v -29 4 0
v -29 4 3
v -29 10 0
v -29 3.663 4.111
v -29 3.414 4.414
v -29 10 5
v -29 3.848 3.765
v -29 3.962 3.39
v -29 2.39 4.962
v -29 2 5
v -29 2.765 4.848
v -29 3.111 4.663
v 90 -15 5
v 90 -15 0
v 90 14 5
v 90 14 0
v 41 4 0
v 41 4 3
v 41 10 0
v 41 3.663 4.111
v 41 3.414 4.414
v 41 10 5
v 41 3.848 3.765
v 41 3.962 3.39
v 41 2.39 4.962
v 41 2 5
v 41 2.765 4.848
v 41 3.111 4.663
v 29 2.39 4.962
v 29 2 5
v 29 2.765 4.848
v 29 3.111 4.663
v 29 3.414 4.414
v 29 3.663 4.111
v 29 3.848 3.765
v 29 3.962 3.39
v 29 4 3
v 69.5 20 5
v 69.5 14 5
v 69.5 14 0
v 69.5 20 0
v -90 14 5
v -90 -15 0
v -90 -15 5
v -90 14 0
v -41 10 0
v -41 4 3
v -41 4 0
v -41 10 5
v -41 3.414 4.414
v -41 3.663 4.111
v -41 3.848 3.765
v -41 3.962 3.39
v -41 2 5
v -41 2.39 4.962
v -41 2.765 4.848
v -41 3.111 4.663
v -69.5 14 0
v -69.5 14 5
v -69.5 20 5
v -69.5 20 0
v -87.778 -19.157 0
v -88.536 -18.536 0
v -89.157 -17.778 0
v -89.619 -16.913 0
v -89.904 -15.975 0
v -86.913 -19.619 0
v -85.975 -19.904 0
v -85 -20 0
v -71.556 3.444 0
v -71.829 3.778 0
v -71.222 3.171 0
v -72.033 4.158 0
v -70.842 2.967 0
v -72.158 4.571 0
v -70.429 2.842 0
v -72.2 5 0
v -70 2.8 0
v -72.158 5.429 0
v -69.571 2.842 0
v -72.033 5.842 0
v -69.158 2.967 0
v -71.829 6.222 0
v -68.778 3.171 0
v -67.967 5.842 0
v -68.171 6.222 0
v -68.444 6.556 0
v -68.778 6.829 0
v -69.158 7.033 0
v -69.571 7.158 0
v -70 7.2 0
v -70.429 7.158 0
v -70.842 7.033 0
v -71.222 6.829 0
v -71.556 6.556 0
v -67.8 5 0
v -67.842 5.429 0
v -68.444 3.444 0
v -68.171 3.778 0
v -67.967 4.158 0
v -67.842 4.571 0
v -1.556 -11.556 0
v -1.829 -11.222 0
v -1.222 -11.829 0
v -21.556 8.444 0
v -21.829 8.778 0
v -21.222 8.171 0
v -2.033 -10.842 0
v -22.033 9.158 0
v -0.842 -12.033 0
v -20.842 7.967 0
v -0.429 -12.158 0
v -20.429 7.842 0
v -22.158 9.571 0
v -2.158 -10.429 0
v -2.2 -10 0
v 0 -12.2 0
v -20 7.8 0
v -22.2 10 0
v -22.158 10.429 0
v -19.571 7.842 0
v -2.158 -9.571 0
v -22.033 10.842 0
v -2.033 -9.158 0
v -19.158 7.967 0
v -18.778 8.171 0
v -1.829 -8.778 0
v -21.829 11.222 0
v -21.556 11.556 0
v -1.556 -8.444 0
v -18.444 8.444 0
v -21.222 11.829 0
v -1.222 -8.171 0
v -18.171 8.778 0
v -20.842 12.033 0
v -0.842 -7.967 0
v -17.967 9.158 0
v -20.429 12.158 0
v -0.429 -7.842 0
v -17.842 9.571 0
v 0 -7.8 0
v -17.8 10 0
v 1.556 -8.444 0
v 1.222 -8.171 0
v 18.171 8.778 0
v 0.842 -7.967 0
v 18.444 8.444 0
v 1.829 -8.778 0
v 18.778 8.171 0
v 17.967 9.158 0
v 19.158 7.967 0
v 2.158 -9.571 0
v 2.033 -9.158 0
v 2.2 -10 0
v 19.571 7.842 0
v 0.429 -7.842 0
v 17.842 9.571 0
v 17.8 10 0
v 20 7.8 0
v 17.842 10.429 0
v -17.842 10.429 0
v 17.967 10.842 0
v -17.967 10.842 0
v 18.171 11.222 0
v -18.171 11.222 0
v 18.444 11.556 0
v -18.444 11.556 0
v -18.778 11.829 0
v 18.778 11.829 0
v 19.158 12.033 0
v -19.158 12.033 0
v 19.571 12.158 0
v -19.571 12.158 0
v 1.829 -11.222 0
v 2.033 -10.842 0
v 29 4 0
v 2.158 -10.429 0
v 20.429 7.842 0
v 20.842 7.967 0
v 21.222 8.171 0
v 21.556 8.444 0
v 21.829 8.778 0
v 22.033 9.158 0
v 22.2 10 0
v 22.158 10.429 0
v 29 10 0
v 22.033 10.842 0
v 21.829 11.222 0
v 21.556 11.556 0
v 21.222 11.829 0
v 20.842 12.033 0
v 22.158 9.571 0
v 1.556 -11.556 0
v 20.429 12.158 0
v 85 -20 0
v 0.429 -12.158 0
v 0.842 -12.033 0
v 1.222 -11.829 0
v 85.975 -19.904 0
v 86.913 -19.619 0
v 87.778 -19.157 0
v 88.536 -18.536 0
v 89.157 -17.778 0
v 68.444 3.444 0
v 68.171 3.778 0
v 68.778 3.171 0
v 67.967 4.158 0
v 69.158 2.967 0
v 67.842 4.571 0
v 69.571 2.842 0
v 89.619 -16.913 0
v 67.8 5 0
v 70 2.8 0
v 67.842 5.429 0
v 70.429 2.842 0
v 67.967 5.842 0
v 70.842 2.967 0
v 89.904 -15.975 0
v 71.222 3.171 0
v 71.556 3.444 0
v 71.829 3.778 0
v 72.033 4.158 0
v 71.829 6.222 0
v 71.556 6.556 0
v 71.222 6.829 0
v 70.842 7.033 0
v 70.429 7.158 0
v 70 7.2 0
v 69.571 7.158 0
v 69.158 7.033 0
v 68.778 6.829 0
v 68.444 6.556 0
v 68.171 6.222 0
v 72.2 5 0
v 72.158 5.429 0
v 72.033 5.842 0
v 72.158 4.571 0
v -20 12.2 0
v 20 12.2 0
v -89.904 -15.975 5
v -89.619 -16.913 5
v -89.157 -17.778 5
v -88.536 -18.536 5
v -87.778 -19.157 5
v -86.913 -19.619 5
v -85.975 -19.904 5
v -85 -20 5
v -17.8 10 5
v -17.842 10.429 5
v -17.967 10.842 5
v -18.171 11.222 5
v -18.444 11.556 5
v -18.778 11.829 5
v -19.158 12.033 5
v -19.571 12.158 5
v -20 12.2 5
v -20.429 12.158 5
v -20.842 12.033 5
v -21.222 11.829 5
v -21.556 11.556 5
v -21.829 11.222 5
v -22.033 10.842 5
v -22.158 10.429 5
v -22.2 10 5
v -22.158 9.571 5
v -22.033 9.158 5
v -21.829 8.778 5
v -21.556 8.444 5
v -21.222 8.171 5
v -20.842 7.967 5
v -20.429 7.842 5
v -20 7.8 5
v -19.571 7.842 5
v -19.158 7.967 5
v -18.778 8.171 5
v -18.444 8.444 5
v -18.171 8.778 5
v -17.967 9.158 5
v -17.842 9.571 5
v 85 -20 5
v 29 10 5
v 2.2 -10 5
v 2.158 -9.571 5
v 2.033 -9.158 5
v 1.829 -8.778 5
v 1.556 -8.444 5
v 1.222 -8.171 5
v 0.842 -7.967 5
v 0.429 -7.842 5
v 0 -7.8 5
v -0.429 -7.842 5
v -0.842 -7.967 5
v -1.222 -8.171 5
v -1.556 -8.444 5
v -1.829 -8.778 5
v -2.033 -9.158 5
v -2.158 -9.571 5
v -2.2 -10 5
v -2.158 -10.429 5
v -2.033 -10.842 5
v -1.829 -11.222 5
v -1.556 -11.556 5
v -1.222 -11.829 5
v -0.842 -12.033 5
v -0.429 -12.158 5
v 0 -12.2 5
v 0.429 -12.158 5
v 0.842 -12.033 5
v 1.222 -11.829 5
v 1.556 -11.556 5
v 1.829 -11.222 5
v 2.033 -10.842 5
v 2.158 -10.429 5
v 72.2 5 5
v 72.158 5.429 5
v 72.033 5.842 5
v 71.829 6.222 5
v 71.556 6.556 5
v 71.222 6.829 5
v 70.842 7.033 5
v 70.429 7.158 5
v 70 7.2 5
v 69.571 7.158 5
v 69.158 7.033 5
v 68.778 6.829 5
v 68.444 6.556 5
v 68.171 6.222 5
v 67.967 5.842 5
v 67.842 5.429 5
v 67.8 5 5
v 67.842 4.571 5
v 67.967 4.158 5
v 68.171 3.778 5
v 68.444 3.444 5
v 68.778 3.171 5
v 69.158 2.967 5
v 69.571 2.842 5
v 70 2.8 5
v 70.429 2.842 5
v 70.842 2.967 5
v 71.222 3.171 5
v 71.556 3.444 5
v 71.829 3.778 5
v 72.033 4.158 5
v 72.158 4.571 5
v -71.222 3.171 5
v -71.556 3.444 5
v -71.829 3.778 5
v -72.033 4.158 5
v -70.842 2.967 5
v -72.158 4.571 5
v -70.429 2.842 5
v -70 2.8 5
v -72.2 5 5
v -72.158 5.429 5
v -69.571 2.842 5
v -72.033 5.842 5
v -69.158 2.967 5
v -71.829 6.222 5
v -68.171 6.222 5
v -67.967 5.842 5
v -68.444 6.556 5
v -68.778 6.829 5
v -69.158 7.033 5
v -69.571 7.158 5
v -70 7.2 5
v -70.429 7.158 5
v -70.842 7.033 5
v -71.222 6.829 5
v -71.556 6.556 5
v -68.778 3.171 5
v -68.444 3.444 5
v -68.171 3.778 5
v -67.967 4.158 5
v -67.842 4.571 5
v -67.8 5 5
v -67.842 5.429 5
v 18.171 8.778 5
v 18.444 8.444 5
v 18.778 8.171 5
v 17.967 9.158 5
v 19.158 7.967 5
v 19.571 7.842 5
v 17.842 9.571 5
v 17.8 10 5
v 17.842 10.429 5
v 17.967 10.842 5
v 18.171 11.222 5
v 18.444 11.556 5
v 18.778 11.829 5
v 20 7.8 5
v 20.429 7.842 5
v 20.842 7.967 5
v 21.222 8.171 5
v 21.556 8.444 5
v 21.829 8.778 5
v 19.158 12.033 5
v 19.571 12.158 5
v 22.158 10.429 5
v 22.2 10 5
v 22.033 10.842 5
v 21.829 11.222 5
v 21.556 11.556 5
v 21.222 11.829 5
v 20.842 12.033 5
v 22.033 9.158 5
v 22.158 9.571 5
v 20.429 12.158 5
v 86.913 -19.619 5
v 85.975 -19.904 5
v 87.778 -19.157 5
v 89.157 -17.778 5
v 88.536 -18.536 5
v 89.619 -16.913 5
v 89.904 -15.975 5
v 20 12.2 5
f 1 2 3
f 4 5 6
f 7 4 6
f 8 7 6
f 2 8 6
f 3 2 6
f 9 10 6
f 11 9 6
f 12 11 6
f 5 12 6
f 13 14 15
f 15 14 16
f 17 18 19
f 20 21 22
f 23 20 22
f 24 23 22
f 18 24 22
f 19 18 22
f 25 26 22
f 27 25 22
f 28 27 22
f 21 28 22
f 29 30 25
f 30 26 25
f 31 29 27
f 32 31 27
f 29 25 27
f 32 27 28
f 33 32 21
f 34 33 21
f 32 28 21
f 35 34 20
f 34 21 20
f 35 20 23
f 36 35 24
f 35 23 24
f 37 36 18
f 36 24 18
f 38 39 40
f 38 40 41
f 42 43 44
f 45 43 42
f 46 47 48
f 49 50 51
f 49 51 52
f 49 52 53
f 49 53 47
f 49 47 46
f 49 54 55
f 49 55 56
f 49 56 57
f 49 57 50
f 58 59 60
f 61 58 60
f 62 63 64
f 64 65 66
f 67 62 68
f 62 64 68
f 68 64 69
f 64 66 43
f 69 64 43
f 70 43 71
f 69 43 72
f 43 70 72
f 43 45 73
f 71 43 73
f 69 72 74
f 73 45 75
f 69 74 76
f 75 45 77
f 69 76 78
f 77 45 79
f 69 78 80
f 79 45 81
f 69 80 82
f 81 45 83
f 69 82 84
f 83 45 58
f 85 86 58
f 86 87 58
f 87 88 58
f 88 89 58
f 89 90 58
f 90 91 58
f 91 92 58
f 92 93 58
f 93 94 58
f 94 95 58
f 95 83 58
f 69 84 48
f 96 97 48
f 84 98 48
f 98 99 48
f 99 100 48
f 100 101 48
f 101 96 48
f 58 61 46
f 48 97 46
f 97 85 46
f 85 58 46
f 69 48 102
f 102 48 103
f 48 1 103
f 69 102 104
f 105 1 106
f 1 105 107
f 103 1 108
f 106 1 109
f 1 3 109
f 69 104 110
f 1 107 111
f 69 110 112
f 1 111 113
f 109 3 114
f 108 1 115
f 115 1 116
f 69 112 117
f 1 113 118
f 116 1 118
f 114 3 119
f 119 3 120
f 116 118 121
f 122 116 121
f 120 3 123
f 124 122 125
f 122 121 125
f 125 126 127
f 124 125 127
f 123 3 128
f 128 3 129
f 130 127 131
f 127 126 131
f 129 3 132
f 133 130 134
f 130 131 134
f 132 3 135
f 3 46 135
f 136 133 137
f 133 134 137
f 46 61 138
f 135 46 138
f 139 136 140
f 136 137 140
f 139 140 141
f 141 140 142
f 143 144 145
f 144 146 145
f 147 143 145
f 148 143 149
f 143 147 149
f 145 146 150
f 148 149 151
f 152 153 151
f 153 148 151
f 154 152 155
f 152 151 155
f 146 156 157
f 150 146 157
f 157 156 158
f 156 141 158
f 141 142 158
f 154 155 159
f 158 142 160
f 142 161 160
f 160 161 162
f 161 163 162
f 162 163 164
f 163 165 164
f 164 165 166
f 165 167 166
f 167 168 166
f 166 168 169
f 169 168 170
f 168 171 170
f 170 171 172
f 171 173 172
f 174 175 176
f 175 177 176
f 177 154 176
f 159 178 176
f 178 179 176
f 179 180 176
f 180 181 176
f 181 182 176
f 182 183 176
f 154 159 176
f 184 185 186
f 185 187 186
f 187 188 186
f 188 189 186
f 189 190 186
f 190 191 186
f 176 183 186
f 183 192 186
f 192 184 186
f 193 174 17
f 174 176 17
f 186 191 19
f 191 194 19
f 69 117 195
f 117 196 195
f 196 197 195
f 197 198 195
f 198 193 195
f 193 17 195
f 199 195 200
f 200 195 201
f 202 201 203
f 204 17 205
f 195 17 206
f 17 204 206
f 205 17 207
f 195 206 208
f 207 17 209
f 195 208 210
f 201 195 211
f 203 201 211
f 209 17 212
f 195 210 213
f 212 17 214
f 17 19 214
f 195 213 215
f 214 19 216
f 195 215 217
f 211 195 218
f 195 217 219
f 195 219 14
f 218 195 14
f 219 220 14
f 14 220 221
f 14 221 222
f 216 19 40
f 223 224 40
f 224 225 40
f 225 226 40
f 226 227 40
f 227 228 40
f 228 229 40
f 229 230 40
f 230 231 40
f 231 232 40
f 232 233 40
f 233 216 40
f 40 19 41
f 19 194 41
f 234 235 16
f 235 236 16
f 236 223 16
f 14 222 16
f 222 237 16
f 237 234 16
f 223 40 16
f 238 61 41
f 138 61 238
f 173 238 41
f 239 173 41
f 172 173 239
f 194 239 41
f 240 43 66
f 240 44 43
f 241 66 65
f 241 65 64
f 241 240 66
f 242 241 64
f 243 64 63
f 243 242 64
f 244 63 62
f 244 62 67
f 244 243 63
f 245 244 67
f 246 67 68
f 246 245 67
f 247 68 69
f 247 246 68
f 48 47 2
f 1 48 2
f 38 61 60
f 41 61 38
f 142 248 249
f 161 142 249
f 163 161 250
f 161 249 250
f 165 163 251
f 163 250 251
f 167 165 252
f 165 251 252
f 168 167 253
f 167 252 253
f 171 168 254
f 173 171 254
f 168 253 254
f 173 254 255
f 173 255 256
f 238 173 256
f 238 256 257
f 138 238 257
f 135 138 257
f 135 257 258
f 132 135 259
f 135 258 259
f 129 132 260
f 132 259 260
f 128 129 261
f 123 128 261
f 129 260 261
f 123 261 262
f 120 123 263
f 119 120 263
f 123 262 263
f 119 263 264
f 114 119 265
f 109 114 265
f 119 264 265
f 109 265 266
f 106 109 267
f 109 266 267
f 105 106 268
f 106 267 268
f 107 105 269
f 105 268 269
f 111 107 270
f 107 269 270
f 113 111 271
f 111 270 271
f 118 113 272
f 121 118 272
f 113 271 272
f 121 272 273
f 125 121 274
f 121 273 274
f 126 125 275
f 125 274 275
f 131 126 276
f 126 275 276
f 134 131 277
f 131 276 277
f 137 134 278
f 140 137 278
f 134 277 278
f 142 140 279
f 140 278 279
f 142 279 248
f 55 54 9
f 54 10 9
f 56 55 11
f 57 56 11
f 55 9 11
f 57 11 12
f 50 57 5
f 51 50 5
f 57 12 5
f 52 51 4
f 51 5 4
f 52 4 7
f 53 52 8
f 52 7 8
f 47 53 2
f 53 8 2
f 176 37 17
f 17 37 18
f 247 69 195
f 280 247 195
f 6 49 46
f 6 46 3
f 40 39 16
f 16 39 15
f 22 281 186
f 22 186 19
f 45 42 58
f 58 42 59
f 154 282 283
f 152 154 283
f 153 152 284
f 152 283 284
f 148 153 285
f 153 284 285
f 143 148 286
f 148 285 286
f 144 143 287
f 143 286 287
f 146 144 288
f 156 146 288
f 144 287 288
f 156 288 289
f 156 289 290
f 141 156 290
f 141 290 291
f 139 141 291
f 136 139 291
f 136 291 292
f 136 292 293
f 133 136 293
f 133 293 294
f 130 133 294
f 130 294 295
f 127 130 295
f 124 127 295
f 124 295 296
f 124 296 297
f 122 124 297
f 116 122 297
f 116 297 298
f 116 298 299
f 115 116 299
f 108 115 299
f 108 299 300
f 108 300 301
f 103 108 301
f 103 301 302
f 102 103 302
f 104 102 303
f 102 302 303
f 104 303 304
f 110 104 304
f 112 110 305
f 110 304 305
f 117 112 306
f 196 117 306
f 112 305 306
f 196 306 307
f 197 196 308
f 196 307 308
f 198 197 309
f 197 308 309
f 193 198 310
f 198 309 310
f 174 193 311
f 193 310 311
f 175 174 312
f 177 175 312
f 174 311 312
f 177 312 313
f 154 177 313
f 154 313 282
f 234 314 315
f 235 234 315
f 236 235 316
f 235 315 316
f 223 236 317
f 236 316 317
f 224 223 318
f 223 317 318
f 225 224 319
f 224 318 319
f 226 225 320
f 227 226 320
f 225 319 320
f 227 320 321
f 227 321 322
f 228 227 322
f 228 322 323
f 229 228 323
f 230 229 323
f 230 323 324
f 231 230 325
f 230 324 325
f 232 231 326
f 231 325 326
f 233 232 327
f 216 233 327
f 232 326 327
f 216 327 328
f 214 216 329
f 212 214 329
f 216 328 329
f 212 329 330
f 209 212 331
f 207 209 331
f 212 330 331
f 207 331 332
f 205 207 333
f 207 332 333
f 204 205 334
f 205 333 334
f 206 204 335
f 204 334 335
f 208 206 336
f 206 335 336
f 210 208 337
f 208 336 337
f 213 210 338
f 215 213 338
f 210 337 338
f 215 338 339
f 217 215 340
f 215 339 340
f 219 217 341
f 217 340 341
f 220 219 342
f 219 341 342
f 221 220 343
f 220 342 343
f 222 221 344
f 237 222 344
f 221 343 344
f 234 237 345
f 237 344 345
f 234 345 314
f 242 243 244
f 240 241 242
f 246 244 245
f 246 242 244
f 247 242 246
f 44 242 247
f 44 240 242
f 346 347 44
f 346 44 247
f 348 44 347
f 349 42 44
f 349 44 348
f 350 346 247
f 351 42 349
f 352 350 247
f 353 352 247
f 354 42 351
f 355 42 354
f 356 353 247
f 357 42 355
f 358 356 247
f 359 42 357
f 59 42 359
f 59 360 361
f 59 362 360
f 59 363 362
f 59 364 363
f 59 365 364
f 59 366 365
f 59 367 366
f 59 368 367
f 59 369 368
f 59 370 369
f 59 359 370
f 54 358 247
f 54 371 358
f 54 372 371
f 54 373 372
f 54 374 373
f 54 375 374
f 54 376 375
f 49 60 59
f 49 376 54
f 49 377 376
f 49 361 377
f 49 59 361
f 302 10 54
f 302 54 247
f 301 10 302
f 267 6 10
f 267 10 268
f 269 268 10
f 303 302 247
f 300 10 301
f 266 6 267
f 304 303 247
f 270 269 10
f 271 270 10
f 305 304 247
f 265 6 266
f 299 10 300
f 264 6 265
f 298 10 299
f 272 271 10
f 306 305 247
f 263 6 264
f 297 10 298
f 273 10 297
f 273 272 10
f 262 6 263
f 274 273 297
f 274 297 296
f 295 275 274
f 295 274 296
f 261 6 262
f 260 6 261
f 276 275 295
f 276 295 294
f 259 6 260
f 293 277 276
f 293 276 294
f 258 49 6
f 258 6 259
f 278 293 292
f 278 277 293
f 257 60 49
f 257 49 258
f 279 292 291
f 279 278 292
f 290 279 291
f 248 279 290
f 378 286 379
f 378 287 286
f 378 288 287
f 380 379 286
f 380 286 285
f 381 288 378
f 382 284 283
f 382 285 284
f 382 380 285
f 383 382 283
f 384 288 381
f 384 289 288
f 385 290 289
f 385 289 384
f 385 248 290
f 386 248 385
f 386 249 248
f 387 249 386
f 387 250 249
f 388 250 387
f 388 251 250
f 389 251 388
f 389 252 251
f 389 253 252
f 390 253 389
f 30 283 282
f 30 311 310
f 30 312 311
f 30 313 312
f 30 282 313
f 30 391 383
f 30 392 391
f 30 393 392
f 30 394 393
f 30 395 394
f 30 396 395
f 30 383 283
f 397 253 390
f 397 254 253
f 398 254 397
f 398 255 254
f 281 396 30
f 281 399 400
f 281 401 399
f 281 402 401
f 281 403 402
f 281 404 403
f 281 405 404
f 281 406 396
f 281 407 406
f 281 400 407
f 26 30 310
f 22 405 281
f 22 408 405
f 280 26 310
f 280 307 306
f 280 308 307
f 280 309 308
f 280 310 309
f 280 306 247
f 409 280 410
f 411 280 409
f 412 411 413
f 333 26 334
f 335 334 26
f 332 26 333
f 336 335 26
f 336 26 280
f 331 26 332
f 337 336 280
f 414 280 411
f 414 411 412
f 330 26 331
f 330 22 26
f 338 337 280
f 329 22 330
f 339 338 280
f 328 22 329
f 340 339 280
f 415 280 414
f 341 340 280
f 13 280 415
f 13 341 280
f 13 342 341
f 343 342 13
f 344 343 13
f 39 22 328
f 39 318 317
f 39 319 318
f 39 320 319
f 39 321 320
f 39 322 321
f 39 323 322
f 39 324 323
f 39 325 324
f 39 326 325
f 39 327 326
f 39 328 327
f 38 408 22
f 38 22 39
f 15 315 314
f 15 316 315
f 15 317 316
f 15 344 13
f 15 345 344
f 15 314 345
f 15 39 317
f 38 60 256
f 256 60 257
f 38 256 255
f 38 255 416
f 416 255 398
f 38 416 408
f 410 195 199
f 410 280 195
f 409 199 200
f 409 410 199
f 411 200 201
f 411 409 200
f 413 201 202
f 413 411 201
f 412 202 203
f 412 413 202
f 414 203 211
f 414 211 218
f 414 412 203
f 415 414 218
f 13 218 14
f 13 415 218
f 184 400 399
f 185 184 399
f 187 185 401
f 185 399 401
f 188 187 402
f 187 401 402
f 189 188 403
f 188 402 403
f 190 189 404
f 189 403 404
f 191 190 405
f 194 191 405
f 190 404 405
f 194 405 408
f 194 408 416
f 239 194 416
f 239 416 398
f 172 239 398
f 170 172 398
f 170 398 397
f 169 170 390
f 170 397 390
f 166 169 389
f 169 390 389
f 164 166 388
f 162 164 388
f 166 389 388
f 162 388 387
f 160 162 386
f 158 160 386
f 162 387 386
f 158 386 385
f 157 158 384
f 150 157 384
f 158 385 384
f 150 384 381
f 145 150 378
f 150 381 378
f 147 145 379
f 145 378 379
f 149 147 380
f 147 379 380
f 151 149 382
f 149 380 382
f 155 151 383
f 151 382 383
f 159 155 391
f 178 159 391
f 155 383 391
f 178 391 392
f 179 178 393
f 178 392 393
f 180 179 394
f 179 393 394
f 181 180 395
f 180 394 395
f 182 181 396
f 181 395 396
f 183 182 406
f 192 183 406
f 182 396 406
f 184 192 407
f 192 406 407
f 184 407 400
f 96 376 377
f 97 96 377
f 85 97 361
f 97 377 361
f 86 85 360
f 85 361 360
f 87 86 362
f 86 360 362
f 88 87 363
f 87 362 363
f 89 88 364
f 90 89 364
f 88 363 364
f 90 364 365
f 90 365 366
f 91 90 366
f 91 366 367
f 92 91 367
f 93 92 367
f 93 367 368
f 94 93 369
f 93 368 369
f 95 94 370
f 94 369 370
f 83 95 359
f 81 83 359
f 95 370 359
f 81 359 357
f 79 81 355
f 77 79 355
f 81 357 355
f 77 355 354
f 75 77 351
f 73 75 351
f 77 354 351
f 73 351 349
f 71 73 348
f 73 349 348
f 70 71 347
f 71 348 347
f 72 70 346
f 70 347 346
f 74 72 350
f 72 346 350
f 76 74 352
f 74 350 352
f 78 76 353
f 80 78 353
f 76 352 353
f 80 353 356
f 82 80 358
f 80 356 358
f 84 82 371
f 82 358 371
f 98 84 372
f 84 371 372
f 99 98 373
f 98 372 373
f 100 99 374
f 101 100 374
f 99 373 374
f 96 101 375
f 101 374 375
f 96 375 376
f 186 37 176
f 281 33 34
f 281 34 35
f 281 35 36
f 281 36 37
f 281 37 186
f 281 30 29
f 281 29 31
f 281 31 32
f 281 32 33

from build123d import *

# Parameters (mm, degrees)
SZKIC1_W                    = 180
SZKIC1_H                    = 40
DODANIE_WYCI_GNI_CIE1_DEPTH = 5
ZAOKR_GLENIE1_R             = 5
SZKIC2_R                    = 2.2
WYTNIJ_WYCI_GNI_CIE1_DEPTH  = 5
SZKIC3_W                    = 20.5
SZKIC3_H                    = 6
WYTNIJ_WYCI_GNI_CIE2_DEPTH  = 10
SZKIC4_R                    = 2.2
WYTNIJ_WYCI_GNI_CIE3_DEPTH  = 10
SZKIC5_W                    = 12
SZKIC5_H                    = 6
WYTNIJ_WYCI_GNI_CIE4_DEPTH  = 93.330926563
ZAOKR_GLENIE2_R             = 2


with BuildPart() as part:
    # Szkic1 → Dodanie-wyciągnięcie1 (new body)
    with BuildSketch(Plane.XY):
        Rectangle(SZKIC1_W, SZKIC1_H)
    extrude(amount=DODANIE_WYCI_GNI_CIE1_DEPTH)

    # Zaokrąglenie1
    zaokr_glenie1_edges = [part.edges().sort_by_distance(p)[0] for p in [
        (90, -20, 2.5),
        (-90, -20, 2.5),
        (-90, 20, 2.5),
        (90, 20, 2.5),
    ]]
    fillet(zaokr_glenie1_edges, radius=ZAOKR_GLENIE1_R)

    # Szkic2 → Wytnij-wyciągnięcie1 (cut)
    with BuildSketch(Plane.XY.offset(5)):
        with Locations((-70, 5)):
            Circle(SZKIC2_R)
        with Locations((-20, 10)):
            Circle(SZKIC2_R)
        with Locations((20, 10)):
            Circle(SZKIC2_R)
        with Locations((70, 5)):
            Circle(SZKIC2_R)
    extrude(amount=-WYTNIJ_WYCI_GNI_CIE1_DEPTH, mode=Mode.SUBTRACT)

    # Szkic3 → Wytnij-wyciągnięcie2 (cut)
    with BuildSketch(Plane.XY.offset(5)):
        with Locations((-79.75, 17)):
            Rectangle(SZKIC3_W, SZKIC3_H)
        with Locations((79.75, 17)):
            Rectangle(SZKIC3_W, SZKIC3_H)
    extrude(amount=-WYTNIJ_WYCI_GNI_CIE2_DEPTH, mode=Mode.SUBTRACT)

    # Szkic4 → Wytnij-wyciągnięcie3 (cut)
    with BuildSketch(Plane.XY.offset(5)):
        with Locations((0, -10)):
            Circle(SZKIC4_R)
    extrude(amount=-WYTNIJ_WYCI_GNI_CIE3_DEPTH, mode=Mode.SUBTRACT)

    # Szkic5 → Wytnij-wyciągnięcie4 (cut, through all)
    with BuildSketch(Plane.XY.offset(5)):
        with Locations((-35, 7)):
            Rectangle(SZKIC5_W, SZKIC5_H)
        with Locations((35, 7)):
            Rectangle(SZKIC5_W, SZKIC5_H)
    extrude(amount=-WYTNIJ_WYCI_GNI_CIE4_DEPTH, mode=Mode.SUBTRACT)

    # Zaokrąglenie2
    zaokr_glenie2_edges = [part.edges().sort_by_distance(p)[0] for p in [
        (-35, 4, 5),
        (35, 4, 5),
    ]]
    fillet(zaokr_glenie2_edges, radius=ZAOKR_GLENIE2_R)


solid = part.part
